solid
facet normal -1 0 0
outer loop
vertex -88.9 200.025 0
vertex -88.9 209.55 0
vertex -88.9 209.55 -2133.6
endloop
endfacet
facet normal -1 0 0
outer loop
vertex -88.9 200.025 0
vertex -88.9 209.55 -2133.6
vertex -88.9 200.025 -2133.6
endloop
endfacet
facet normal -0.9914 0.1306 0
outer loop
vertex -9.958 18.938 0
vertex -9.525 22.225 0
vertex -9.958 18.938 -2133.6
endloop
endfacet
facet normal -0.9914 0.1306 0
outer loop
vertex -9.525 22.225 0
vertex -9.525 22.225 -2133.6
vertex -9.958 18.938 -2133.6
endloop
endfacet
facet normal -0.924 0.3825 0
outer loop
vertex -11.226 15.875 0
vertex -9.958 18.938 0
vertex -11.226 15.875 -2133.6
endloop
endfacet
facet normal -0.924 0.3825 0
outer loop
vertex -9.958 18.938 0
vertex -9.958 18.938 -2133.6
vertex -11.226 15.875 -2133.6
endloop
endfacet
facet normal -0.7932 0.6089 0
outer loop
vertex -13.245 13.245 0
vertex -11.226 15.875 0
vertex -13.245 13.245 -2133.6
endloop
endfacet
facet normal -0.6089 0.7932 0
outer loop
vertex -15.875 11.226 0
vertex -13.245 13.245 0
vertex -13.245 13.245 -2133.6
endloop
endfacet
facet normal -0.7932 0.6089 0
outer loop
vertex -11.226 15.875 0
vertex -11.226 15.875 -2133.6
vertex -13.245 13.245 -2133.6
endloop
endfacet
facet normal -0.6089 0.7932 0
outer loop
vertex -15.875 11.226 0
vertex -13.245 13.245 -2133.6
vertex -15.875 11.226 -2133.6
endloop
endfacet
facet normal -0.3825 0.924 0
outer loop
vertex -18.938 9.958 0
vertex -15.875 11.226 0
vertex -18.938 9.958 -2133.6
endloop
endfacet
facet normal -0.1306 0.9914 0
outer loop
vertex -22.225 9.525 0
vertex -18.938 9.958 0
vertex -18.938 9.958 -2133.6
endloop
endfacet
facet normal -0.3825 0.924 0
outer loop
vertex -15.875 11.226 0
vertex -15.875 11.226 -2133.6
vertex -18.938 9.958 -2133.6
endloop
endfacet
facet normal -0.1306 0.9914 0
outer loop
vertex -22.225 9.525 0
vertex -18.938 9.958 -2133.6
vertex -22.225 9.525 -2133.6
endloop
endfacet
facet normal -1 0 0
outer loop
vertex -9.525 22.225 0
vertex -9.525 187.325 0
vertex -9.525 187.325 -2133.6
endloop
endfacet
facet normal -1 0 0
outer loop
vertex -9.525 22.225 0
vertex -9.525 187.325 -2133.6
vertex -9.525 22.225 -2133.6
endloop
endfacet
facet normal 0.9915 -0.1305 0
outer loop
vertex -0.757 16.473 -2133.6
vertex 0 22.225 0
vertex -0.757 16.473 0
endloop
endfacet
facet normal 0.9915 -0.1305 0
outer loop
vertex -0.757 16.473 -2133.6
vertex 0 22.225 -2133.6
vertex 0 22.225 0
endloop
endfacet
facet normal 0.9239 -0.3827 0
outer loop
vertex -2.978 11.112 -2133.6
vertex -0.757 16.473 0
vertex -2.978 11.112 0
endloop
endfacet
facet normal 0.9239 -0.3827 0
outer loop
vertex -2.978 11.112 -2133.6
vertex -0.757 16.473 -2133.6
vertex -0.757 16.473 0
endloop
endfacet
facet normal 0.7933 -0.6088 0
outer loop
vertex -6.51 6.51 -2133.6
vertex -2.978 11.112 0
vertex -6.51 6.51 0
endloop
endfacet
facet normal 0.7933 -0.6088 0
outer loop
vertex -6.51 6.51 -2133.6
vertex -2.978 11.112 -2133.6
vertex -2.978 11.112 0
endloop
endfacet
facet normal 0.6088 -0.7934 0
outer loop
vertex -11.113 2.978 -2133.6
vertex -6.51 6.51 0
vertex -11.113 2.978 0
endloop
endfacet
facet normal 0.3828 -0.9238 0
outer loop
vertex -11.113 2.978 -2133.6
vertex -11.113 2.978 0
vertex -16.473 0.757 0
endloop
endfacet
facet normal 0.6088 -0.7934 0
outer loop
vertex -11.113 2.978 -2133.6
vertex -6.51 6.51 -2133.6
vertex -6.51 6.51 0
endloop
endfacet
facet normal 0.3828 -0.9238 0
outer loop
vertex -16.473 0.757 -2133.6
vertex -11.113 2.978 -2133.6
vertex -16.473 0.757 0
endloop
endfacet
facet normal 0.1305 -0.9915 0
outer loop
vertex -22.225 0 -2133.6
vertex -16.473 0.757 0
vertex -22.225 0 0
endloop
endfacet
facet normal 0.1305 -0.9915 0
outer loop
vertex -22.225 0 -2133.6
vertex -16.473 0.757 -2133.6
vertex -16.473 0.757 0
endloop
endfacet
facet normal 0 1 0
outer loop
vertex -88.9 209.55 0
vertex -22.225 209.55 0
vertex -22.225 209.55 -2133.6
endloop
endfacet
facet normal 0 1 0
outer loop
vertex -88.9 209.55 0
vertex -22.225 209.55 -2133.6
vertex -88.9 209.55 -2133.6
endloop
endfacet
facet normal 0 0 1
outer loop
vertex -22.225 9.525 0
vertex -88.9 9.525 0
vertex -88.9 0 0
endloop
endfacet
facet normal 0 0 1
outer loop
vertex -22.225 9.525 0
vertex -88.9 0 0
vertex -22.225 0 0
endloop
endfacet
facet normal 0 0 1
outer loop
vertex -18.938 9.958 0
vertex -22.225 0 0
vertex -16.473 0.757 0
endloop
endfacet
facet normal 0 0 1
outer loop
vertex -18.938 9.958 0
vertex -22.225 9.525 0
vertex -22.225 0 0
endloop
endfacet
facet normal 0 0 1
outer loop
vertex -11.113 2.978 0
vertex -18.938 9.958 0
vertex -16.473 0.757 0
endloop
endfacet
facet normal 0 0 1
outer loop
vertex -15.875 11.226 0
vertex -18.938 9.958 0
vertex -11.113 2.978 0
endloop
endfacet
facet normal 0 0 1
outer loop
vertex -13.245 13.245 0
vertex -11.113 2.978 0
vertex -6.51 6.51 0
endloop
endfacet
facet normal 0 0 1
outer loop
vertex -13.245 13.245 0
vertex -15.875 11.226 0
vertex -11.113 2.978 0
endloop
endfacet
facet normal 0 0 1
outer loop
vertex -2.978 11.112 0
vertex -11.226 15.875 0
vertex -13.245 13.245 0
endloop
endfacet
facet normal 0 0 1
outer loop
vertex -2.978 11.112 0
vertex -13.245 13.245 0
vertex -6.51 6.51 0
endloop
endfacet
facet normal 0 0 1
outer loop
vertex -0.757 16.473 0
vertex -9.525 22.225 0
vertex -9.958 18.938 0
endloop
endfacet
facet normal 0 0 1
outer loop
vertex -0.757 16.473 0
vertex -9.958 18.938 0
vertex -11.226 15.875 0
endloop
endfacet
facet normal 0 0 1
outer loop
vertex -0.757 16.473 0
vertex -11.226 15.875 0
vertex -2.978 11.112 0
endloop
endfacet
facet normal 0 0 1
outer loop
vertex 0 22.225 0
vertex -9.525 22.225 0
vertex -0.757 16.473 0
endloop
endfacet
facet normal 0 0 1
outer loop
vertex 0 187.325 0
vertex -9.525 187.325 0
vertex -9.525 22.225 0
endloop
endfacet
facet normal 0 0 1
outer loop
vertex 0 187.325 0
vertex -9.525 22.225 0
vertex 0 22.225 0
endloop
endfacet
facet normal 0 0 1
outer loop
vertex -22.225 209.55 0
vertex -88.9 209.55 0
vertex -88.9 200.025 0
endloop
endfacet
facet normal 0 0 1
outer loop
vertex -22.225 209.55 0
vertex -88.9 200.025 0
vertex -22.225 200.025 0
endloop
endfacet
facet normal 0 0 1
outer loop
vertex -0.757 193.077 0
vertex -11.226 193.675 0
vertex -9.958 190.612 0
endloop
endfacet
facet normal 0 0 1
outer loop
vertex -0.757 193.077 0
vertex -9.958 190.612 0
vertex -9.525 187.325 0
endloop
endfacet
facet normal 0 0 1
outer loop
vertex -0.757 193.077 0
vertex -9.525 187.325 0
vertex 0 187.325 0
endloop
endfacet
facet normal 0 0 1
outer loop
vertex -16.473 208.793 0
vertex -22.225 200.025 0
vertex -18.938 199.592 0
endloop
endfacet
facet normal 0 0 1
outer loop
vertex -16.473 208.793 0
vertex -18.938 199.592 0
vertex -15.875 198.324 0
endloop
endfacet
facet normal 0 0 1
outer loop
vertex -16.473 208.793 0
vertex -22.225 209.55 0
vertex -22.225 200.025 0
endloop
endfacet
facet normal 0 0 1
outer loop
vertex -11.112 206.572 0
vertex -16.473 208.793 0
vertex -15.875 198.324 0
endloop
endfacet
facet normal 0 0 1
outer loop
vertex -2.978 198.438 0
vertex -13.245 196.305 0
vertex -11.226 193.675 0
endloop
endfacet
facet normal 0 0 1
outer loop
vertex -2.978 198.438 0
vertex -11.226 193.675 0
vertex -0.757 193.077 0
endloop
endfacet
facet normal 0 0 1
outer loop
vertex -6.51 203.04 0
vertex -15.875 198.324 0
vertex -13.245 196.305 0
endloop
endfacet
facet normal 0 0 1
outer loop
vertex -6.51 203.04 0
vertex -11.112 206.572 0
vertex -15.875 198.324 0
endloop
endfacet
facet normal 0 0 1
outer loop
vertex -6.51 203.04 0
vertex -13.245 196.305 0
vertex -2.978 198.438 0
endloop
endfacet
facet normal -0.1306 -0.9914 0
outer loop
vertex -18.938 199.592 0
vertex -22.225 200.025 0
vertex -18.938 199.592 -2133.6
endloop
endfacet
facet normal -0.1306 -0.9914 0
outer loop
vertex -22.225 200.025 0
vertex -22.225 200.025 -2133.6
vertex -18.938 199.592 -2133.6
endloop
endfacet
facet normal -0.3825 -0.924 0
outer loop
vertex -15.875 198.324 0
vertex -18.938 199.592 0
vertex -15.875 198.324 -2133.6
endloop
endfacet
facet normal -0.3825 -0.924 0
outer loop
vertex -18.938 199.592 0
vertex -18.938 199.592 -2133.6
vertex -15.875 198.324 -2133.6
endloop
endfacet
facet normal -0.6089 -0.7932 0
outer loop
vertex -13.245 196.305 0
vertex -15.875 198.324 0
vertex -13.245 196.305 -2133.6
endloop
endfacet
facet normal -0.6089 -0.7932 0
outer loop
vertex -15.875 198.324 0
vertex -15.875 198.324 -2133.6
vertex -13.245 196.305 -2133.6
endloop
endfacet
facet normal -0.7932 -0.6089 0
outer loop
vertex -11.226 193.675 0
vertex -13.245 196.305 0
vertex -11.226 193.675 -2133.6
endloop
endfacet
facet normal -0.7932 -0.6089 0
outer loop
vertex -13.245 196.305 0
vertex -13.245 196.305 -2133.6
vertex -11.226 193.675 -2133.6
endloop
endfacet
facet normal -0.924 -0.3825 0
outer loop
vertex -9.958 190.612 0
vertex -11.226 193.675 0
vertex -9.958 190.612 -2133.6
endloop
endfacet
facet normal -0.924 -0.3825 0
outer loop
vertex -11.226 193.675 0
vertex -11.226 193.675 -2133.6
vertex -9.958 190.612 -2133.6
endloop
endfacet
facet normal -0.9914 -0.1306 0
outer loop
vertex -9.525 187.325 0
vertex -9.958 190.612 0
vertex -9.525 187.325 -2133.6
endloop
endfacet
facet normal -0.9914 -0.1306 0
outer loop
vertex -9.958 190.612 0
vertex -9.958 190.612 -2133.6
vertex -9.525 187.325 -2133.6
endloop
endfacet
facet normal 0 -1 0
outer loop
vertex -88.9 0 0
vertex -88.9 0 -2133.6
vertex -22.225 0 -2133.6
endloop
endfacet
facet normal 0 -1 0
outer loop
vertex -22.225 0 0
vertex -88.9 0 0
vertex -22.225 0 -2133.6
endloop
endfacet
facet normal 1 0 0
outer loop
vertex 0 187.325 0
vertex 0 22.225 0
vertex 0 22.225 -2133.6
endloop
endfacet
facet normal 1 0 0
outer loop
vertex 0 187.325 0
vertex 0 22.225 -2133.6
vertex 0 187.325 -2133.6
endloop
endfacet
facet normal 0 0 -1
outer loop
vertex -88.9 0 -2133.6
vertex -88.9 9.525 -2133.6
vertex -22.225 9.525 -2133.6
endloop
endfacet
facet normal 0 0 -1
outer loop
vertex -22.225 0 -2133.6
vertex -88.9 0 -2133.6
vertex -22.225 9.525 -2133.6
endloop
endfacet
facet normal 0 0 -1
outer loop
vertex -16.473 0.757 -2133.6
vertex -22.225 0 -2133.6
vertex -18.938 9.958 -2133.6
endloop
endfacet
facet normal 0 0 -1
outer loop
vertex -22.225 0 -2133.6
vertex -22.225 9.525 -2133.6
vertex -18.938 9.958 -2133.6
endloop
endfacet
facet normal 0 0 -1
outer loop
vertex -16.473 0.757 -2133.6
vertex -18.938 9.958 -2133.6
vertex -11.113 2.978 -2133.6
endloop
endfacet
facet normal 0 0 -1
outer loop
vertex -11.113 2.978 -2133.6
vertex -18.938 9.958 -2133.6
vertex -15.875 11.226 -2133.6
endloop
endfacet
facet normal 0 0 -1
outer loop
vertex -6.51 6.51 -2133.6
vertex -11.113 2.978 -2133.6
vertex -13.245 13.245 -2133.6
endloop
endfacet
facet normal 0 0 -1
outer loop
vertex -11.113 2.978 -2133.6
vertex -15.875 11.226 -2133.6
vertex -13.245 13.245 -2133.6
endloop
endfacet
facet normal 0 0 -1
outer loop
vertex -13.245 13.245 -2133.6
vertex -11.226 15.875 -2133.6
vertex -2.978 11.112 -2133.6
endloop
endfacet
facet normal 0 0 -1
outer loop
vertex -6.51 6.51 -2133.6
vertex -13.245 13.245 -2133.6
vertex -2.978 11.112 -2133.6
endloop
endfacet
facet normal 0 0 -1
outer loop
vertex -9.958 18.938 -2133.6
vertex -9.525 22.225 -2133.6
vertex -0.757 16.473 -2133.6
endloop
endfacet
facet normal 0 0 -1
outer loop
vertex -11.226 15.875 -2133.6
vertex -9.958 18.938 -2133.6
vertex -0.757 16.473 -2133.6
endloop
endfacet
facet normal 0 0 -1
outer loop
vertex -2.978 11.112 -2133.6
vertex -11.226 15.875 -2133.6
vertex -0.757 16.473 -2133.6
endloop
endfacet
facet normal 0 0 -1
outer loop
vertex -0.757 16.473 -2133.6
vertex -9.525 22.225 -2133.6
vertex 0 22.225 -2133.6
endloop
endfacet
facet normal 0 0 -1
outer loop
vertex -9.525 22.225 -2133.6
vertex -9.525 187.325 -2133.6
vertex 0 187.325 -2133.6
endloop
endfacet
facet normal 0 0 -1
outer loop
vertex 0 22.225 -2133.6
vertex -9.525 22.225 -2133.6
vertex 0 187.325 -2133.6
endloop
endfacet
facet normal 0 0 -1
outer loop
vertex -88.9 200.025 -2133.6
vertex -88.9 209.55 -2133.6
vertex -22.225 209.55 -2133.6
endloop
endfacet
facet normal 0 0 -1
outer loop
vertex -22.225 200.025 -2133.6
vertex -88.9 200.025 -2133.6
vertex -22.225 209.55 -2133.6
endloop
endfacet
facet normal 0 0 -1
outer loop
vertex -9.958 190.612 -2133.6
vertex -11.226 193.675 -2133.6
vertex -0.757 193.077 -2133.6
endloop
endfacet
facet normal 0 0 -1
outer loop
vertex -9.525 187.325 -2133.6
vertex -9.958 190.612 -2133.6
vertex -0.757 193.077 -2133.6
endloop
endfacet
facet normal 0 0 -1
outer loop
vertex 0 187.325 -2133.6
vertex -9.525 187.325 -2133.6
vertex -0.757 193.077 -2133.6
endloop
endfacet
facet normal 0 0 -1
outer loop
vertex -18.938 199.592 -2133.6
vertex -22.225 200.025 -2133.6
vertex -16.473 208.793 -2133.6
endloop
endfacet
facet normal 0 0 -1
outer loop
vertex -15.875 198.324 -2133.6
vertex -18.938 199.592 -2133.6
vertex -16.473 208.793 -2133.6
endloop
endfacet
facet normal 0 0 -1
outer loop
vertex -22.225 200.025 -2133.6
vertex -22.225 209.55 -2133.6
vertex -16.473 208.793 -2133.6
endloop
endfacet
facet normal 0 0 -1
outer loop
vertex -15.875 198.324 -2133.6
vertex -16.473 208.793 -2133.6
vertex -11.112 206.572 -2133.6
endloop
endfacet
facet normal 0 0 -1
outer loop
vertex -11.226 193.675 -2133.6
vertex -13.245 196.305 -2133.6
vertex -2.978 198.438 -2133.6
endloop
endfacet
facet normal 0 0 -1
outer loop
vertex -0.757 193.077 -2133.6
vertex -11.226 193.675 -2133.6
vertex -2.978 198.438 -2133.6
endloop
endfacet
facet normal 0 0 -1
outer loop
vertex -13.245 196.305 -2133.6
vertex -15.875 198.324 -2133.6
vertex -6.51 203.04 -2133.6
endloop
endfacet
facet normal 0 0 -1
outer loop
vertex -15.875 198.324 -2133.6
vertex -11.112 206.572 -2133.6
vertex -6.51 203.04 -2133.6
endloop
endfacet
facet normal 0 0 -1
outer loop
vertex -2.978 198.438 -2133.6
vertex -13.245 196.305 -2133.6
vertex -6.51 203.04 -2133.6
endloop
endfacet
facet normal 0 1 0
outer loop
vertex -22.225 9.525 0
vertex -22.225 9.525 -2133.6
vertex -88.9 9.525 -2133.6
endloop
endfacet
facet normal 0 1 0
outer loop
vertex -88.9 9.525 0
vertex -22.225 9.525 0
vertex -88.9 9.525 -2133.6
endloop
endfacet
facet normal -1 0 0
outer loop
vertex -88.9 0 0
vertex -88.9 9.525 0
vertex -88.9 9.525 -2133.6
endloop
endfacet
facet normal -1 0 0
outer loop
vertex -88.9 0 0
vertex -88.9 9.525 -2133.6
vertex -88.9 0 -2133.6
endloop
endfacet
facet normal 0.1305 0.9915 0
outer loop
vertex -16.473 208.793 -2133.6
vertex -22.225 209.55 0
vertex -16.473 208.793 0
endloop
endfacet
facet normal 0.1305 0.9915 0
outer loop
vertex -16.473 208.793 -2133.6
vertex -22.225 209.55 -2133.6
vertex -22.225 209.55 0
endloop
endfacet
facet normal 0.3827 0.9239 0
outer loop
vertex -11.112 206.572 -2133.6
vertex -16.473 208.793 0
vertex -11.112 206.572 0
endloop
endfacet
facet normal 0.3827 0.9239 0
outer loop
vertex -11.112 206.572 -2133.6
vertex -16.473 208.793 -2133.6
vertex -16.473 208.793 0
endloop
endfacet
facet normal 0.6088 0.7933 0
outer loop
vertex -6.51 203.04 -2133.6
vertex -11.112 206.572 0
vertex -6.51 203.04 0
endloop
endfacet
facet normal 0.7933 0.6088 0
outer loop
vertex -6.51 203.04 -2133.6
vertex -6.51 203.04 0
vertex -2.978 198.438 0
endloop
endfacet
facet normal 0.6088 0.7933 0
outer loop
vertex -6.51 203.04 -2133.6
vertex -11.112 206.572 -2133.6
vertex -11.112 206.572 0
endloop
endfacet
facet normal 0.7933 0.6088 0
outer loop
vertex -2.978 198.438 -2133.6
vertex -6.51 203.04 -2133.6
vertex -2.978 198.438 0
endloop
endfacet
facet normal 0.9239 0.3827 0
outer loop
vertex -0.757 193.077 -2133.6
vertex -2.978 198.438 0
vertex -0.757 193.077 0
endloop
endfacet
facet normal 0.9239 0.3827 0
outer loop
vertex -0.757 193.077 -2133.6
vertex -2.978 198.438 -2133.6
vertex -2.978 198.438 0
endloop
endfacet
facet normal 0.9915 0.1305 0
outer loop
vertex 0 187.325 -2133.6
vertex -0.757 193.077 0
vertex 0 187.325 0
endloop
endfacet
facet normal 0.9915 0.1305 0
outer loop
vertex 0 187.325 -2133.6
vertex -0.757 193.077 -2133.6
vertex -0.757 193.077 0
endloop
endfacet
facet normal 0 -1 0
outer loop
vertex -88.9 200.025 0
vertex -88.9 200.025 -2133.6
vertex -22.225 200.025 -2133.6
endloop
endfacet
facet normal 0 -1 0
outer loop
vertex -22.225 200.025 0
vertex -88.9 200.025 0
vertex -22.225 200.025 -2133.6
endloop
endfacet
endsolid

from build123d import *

# Parameters (mm, degrees)
BASE_EXTRUDE_THIN_DEPTH = 2133.6
INSIDE_BEND_RADIUS_R    = 12.7
OUTSIDE_BEND_RADIUS_R   = 22.225


with BuildPart() as part:
    # Sketch1 → Base-Extrude-Thin (new body)
    with BuildSketch(Plane.XY):
        Polygon((-88.9, 0), (0, 0), (0, 209.55), (-88.9, 209.55), (-88.9, 200.025), (-9.525, 200.025), (-9.525, 9.525), (-88.9, 9.525), align=None)
    extrude(amount=-BASE_EXTRUDE_THIN_DEPTH)

    # Inside Bend Radius
    inside_bend_radius_edges = [part.edges().sort_by_distance(p)[0] for p in [
        (-9.525, 200.025, -1066.8),
        (-9.525, 9.525, -1066.8),
    ]]
    fillet(inside_bend_radius_edges, radius=INSIDE_BEND_RADIUS_R)

    # Outside Bend Radius
    outside_bend_radius_edges = [part.edges().sort_by_distance(p)[0] for p in [
        (0, 0, -1066.8),
        (0, 209.55, -1066.8),
    ]]
    fillet(outside_bend_radius_edges, radius=OUTSIDE_BEND_RADIUS_R)


solid = part.part
